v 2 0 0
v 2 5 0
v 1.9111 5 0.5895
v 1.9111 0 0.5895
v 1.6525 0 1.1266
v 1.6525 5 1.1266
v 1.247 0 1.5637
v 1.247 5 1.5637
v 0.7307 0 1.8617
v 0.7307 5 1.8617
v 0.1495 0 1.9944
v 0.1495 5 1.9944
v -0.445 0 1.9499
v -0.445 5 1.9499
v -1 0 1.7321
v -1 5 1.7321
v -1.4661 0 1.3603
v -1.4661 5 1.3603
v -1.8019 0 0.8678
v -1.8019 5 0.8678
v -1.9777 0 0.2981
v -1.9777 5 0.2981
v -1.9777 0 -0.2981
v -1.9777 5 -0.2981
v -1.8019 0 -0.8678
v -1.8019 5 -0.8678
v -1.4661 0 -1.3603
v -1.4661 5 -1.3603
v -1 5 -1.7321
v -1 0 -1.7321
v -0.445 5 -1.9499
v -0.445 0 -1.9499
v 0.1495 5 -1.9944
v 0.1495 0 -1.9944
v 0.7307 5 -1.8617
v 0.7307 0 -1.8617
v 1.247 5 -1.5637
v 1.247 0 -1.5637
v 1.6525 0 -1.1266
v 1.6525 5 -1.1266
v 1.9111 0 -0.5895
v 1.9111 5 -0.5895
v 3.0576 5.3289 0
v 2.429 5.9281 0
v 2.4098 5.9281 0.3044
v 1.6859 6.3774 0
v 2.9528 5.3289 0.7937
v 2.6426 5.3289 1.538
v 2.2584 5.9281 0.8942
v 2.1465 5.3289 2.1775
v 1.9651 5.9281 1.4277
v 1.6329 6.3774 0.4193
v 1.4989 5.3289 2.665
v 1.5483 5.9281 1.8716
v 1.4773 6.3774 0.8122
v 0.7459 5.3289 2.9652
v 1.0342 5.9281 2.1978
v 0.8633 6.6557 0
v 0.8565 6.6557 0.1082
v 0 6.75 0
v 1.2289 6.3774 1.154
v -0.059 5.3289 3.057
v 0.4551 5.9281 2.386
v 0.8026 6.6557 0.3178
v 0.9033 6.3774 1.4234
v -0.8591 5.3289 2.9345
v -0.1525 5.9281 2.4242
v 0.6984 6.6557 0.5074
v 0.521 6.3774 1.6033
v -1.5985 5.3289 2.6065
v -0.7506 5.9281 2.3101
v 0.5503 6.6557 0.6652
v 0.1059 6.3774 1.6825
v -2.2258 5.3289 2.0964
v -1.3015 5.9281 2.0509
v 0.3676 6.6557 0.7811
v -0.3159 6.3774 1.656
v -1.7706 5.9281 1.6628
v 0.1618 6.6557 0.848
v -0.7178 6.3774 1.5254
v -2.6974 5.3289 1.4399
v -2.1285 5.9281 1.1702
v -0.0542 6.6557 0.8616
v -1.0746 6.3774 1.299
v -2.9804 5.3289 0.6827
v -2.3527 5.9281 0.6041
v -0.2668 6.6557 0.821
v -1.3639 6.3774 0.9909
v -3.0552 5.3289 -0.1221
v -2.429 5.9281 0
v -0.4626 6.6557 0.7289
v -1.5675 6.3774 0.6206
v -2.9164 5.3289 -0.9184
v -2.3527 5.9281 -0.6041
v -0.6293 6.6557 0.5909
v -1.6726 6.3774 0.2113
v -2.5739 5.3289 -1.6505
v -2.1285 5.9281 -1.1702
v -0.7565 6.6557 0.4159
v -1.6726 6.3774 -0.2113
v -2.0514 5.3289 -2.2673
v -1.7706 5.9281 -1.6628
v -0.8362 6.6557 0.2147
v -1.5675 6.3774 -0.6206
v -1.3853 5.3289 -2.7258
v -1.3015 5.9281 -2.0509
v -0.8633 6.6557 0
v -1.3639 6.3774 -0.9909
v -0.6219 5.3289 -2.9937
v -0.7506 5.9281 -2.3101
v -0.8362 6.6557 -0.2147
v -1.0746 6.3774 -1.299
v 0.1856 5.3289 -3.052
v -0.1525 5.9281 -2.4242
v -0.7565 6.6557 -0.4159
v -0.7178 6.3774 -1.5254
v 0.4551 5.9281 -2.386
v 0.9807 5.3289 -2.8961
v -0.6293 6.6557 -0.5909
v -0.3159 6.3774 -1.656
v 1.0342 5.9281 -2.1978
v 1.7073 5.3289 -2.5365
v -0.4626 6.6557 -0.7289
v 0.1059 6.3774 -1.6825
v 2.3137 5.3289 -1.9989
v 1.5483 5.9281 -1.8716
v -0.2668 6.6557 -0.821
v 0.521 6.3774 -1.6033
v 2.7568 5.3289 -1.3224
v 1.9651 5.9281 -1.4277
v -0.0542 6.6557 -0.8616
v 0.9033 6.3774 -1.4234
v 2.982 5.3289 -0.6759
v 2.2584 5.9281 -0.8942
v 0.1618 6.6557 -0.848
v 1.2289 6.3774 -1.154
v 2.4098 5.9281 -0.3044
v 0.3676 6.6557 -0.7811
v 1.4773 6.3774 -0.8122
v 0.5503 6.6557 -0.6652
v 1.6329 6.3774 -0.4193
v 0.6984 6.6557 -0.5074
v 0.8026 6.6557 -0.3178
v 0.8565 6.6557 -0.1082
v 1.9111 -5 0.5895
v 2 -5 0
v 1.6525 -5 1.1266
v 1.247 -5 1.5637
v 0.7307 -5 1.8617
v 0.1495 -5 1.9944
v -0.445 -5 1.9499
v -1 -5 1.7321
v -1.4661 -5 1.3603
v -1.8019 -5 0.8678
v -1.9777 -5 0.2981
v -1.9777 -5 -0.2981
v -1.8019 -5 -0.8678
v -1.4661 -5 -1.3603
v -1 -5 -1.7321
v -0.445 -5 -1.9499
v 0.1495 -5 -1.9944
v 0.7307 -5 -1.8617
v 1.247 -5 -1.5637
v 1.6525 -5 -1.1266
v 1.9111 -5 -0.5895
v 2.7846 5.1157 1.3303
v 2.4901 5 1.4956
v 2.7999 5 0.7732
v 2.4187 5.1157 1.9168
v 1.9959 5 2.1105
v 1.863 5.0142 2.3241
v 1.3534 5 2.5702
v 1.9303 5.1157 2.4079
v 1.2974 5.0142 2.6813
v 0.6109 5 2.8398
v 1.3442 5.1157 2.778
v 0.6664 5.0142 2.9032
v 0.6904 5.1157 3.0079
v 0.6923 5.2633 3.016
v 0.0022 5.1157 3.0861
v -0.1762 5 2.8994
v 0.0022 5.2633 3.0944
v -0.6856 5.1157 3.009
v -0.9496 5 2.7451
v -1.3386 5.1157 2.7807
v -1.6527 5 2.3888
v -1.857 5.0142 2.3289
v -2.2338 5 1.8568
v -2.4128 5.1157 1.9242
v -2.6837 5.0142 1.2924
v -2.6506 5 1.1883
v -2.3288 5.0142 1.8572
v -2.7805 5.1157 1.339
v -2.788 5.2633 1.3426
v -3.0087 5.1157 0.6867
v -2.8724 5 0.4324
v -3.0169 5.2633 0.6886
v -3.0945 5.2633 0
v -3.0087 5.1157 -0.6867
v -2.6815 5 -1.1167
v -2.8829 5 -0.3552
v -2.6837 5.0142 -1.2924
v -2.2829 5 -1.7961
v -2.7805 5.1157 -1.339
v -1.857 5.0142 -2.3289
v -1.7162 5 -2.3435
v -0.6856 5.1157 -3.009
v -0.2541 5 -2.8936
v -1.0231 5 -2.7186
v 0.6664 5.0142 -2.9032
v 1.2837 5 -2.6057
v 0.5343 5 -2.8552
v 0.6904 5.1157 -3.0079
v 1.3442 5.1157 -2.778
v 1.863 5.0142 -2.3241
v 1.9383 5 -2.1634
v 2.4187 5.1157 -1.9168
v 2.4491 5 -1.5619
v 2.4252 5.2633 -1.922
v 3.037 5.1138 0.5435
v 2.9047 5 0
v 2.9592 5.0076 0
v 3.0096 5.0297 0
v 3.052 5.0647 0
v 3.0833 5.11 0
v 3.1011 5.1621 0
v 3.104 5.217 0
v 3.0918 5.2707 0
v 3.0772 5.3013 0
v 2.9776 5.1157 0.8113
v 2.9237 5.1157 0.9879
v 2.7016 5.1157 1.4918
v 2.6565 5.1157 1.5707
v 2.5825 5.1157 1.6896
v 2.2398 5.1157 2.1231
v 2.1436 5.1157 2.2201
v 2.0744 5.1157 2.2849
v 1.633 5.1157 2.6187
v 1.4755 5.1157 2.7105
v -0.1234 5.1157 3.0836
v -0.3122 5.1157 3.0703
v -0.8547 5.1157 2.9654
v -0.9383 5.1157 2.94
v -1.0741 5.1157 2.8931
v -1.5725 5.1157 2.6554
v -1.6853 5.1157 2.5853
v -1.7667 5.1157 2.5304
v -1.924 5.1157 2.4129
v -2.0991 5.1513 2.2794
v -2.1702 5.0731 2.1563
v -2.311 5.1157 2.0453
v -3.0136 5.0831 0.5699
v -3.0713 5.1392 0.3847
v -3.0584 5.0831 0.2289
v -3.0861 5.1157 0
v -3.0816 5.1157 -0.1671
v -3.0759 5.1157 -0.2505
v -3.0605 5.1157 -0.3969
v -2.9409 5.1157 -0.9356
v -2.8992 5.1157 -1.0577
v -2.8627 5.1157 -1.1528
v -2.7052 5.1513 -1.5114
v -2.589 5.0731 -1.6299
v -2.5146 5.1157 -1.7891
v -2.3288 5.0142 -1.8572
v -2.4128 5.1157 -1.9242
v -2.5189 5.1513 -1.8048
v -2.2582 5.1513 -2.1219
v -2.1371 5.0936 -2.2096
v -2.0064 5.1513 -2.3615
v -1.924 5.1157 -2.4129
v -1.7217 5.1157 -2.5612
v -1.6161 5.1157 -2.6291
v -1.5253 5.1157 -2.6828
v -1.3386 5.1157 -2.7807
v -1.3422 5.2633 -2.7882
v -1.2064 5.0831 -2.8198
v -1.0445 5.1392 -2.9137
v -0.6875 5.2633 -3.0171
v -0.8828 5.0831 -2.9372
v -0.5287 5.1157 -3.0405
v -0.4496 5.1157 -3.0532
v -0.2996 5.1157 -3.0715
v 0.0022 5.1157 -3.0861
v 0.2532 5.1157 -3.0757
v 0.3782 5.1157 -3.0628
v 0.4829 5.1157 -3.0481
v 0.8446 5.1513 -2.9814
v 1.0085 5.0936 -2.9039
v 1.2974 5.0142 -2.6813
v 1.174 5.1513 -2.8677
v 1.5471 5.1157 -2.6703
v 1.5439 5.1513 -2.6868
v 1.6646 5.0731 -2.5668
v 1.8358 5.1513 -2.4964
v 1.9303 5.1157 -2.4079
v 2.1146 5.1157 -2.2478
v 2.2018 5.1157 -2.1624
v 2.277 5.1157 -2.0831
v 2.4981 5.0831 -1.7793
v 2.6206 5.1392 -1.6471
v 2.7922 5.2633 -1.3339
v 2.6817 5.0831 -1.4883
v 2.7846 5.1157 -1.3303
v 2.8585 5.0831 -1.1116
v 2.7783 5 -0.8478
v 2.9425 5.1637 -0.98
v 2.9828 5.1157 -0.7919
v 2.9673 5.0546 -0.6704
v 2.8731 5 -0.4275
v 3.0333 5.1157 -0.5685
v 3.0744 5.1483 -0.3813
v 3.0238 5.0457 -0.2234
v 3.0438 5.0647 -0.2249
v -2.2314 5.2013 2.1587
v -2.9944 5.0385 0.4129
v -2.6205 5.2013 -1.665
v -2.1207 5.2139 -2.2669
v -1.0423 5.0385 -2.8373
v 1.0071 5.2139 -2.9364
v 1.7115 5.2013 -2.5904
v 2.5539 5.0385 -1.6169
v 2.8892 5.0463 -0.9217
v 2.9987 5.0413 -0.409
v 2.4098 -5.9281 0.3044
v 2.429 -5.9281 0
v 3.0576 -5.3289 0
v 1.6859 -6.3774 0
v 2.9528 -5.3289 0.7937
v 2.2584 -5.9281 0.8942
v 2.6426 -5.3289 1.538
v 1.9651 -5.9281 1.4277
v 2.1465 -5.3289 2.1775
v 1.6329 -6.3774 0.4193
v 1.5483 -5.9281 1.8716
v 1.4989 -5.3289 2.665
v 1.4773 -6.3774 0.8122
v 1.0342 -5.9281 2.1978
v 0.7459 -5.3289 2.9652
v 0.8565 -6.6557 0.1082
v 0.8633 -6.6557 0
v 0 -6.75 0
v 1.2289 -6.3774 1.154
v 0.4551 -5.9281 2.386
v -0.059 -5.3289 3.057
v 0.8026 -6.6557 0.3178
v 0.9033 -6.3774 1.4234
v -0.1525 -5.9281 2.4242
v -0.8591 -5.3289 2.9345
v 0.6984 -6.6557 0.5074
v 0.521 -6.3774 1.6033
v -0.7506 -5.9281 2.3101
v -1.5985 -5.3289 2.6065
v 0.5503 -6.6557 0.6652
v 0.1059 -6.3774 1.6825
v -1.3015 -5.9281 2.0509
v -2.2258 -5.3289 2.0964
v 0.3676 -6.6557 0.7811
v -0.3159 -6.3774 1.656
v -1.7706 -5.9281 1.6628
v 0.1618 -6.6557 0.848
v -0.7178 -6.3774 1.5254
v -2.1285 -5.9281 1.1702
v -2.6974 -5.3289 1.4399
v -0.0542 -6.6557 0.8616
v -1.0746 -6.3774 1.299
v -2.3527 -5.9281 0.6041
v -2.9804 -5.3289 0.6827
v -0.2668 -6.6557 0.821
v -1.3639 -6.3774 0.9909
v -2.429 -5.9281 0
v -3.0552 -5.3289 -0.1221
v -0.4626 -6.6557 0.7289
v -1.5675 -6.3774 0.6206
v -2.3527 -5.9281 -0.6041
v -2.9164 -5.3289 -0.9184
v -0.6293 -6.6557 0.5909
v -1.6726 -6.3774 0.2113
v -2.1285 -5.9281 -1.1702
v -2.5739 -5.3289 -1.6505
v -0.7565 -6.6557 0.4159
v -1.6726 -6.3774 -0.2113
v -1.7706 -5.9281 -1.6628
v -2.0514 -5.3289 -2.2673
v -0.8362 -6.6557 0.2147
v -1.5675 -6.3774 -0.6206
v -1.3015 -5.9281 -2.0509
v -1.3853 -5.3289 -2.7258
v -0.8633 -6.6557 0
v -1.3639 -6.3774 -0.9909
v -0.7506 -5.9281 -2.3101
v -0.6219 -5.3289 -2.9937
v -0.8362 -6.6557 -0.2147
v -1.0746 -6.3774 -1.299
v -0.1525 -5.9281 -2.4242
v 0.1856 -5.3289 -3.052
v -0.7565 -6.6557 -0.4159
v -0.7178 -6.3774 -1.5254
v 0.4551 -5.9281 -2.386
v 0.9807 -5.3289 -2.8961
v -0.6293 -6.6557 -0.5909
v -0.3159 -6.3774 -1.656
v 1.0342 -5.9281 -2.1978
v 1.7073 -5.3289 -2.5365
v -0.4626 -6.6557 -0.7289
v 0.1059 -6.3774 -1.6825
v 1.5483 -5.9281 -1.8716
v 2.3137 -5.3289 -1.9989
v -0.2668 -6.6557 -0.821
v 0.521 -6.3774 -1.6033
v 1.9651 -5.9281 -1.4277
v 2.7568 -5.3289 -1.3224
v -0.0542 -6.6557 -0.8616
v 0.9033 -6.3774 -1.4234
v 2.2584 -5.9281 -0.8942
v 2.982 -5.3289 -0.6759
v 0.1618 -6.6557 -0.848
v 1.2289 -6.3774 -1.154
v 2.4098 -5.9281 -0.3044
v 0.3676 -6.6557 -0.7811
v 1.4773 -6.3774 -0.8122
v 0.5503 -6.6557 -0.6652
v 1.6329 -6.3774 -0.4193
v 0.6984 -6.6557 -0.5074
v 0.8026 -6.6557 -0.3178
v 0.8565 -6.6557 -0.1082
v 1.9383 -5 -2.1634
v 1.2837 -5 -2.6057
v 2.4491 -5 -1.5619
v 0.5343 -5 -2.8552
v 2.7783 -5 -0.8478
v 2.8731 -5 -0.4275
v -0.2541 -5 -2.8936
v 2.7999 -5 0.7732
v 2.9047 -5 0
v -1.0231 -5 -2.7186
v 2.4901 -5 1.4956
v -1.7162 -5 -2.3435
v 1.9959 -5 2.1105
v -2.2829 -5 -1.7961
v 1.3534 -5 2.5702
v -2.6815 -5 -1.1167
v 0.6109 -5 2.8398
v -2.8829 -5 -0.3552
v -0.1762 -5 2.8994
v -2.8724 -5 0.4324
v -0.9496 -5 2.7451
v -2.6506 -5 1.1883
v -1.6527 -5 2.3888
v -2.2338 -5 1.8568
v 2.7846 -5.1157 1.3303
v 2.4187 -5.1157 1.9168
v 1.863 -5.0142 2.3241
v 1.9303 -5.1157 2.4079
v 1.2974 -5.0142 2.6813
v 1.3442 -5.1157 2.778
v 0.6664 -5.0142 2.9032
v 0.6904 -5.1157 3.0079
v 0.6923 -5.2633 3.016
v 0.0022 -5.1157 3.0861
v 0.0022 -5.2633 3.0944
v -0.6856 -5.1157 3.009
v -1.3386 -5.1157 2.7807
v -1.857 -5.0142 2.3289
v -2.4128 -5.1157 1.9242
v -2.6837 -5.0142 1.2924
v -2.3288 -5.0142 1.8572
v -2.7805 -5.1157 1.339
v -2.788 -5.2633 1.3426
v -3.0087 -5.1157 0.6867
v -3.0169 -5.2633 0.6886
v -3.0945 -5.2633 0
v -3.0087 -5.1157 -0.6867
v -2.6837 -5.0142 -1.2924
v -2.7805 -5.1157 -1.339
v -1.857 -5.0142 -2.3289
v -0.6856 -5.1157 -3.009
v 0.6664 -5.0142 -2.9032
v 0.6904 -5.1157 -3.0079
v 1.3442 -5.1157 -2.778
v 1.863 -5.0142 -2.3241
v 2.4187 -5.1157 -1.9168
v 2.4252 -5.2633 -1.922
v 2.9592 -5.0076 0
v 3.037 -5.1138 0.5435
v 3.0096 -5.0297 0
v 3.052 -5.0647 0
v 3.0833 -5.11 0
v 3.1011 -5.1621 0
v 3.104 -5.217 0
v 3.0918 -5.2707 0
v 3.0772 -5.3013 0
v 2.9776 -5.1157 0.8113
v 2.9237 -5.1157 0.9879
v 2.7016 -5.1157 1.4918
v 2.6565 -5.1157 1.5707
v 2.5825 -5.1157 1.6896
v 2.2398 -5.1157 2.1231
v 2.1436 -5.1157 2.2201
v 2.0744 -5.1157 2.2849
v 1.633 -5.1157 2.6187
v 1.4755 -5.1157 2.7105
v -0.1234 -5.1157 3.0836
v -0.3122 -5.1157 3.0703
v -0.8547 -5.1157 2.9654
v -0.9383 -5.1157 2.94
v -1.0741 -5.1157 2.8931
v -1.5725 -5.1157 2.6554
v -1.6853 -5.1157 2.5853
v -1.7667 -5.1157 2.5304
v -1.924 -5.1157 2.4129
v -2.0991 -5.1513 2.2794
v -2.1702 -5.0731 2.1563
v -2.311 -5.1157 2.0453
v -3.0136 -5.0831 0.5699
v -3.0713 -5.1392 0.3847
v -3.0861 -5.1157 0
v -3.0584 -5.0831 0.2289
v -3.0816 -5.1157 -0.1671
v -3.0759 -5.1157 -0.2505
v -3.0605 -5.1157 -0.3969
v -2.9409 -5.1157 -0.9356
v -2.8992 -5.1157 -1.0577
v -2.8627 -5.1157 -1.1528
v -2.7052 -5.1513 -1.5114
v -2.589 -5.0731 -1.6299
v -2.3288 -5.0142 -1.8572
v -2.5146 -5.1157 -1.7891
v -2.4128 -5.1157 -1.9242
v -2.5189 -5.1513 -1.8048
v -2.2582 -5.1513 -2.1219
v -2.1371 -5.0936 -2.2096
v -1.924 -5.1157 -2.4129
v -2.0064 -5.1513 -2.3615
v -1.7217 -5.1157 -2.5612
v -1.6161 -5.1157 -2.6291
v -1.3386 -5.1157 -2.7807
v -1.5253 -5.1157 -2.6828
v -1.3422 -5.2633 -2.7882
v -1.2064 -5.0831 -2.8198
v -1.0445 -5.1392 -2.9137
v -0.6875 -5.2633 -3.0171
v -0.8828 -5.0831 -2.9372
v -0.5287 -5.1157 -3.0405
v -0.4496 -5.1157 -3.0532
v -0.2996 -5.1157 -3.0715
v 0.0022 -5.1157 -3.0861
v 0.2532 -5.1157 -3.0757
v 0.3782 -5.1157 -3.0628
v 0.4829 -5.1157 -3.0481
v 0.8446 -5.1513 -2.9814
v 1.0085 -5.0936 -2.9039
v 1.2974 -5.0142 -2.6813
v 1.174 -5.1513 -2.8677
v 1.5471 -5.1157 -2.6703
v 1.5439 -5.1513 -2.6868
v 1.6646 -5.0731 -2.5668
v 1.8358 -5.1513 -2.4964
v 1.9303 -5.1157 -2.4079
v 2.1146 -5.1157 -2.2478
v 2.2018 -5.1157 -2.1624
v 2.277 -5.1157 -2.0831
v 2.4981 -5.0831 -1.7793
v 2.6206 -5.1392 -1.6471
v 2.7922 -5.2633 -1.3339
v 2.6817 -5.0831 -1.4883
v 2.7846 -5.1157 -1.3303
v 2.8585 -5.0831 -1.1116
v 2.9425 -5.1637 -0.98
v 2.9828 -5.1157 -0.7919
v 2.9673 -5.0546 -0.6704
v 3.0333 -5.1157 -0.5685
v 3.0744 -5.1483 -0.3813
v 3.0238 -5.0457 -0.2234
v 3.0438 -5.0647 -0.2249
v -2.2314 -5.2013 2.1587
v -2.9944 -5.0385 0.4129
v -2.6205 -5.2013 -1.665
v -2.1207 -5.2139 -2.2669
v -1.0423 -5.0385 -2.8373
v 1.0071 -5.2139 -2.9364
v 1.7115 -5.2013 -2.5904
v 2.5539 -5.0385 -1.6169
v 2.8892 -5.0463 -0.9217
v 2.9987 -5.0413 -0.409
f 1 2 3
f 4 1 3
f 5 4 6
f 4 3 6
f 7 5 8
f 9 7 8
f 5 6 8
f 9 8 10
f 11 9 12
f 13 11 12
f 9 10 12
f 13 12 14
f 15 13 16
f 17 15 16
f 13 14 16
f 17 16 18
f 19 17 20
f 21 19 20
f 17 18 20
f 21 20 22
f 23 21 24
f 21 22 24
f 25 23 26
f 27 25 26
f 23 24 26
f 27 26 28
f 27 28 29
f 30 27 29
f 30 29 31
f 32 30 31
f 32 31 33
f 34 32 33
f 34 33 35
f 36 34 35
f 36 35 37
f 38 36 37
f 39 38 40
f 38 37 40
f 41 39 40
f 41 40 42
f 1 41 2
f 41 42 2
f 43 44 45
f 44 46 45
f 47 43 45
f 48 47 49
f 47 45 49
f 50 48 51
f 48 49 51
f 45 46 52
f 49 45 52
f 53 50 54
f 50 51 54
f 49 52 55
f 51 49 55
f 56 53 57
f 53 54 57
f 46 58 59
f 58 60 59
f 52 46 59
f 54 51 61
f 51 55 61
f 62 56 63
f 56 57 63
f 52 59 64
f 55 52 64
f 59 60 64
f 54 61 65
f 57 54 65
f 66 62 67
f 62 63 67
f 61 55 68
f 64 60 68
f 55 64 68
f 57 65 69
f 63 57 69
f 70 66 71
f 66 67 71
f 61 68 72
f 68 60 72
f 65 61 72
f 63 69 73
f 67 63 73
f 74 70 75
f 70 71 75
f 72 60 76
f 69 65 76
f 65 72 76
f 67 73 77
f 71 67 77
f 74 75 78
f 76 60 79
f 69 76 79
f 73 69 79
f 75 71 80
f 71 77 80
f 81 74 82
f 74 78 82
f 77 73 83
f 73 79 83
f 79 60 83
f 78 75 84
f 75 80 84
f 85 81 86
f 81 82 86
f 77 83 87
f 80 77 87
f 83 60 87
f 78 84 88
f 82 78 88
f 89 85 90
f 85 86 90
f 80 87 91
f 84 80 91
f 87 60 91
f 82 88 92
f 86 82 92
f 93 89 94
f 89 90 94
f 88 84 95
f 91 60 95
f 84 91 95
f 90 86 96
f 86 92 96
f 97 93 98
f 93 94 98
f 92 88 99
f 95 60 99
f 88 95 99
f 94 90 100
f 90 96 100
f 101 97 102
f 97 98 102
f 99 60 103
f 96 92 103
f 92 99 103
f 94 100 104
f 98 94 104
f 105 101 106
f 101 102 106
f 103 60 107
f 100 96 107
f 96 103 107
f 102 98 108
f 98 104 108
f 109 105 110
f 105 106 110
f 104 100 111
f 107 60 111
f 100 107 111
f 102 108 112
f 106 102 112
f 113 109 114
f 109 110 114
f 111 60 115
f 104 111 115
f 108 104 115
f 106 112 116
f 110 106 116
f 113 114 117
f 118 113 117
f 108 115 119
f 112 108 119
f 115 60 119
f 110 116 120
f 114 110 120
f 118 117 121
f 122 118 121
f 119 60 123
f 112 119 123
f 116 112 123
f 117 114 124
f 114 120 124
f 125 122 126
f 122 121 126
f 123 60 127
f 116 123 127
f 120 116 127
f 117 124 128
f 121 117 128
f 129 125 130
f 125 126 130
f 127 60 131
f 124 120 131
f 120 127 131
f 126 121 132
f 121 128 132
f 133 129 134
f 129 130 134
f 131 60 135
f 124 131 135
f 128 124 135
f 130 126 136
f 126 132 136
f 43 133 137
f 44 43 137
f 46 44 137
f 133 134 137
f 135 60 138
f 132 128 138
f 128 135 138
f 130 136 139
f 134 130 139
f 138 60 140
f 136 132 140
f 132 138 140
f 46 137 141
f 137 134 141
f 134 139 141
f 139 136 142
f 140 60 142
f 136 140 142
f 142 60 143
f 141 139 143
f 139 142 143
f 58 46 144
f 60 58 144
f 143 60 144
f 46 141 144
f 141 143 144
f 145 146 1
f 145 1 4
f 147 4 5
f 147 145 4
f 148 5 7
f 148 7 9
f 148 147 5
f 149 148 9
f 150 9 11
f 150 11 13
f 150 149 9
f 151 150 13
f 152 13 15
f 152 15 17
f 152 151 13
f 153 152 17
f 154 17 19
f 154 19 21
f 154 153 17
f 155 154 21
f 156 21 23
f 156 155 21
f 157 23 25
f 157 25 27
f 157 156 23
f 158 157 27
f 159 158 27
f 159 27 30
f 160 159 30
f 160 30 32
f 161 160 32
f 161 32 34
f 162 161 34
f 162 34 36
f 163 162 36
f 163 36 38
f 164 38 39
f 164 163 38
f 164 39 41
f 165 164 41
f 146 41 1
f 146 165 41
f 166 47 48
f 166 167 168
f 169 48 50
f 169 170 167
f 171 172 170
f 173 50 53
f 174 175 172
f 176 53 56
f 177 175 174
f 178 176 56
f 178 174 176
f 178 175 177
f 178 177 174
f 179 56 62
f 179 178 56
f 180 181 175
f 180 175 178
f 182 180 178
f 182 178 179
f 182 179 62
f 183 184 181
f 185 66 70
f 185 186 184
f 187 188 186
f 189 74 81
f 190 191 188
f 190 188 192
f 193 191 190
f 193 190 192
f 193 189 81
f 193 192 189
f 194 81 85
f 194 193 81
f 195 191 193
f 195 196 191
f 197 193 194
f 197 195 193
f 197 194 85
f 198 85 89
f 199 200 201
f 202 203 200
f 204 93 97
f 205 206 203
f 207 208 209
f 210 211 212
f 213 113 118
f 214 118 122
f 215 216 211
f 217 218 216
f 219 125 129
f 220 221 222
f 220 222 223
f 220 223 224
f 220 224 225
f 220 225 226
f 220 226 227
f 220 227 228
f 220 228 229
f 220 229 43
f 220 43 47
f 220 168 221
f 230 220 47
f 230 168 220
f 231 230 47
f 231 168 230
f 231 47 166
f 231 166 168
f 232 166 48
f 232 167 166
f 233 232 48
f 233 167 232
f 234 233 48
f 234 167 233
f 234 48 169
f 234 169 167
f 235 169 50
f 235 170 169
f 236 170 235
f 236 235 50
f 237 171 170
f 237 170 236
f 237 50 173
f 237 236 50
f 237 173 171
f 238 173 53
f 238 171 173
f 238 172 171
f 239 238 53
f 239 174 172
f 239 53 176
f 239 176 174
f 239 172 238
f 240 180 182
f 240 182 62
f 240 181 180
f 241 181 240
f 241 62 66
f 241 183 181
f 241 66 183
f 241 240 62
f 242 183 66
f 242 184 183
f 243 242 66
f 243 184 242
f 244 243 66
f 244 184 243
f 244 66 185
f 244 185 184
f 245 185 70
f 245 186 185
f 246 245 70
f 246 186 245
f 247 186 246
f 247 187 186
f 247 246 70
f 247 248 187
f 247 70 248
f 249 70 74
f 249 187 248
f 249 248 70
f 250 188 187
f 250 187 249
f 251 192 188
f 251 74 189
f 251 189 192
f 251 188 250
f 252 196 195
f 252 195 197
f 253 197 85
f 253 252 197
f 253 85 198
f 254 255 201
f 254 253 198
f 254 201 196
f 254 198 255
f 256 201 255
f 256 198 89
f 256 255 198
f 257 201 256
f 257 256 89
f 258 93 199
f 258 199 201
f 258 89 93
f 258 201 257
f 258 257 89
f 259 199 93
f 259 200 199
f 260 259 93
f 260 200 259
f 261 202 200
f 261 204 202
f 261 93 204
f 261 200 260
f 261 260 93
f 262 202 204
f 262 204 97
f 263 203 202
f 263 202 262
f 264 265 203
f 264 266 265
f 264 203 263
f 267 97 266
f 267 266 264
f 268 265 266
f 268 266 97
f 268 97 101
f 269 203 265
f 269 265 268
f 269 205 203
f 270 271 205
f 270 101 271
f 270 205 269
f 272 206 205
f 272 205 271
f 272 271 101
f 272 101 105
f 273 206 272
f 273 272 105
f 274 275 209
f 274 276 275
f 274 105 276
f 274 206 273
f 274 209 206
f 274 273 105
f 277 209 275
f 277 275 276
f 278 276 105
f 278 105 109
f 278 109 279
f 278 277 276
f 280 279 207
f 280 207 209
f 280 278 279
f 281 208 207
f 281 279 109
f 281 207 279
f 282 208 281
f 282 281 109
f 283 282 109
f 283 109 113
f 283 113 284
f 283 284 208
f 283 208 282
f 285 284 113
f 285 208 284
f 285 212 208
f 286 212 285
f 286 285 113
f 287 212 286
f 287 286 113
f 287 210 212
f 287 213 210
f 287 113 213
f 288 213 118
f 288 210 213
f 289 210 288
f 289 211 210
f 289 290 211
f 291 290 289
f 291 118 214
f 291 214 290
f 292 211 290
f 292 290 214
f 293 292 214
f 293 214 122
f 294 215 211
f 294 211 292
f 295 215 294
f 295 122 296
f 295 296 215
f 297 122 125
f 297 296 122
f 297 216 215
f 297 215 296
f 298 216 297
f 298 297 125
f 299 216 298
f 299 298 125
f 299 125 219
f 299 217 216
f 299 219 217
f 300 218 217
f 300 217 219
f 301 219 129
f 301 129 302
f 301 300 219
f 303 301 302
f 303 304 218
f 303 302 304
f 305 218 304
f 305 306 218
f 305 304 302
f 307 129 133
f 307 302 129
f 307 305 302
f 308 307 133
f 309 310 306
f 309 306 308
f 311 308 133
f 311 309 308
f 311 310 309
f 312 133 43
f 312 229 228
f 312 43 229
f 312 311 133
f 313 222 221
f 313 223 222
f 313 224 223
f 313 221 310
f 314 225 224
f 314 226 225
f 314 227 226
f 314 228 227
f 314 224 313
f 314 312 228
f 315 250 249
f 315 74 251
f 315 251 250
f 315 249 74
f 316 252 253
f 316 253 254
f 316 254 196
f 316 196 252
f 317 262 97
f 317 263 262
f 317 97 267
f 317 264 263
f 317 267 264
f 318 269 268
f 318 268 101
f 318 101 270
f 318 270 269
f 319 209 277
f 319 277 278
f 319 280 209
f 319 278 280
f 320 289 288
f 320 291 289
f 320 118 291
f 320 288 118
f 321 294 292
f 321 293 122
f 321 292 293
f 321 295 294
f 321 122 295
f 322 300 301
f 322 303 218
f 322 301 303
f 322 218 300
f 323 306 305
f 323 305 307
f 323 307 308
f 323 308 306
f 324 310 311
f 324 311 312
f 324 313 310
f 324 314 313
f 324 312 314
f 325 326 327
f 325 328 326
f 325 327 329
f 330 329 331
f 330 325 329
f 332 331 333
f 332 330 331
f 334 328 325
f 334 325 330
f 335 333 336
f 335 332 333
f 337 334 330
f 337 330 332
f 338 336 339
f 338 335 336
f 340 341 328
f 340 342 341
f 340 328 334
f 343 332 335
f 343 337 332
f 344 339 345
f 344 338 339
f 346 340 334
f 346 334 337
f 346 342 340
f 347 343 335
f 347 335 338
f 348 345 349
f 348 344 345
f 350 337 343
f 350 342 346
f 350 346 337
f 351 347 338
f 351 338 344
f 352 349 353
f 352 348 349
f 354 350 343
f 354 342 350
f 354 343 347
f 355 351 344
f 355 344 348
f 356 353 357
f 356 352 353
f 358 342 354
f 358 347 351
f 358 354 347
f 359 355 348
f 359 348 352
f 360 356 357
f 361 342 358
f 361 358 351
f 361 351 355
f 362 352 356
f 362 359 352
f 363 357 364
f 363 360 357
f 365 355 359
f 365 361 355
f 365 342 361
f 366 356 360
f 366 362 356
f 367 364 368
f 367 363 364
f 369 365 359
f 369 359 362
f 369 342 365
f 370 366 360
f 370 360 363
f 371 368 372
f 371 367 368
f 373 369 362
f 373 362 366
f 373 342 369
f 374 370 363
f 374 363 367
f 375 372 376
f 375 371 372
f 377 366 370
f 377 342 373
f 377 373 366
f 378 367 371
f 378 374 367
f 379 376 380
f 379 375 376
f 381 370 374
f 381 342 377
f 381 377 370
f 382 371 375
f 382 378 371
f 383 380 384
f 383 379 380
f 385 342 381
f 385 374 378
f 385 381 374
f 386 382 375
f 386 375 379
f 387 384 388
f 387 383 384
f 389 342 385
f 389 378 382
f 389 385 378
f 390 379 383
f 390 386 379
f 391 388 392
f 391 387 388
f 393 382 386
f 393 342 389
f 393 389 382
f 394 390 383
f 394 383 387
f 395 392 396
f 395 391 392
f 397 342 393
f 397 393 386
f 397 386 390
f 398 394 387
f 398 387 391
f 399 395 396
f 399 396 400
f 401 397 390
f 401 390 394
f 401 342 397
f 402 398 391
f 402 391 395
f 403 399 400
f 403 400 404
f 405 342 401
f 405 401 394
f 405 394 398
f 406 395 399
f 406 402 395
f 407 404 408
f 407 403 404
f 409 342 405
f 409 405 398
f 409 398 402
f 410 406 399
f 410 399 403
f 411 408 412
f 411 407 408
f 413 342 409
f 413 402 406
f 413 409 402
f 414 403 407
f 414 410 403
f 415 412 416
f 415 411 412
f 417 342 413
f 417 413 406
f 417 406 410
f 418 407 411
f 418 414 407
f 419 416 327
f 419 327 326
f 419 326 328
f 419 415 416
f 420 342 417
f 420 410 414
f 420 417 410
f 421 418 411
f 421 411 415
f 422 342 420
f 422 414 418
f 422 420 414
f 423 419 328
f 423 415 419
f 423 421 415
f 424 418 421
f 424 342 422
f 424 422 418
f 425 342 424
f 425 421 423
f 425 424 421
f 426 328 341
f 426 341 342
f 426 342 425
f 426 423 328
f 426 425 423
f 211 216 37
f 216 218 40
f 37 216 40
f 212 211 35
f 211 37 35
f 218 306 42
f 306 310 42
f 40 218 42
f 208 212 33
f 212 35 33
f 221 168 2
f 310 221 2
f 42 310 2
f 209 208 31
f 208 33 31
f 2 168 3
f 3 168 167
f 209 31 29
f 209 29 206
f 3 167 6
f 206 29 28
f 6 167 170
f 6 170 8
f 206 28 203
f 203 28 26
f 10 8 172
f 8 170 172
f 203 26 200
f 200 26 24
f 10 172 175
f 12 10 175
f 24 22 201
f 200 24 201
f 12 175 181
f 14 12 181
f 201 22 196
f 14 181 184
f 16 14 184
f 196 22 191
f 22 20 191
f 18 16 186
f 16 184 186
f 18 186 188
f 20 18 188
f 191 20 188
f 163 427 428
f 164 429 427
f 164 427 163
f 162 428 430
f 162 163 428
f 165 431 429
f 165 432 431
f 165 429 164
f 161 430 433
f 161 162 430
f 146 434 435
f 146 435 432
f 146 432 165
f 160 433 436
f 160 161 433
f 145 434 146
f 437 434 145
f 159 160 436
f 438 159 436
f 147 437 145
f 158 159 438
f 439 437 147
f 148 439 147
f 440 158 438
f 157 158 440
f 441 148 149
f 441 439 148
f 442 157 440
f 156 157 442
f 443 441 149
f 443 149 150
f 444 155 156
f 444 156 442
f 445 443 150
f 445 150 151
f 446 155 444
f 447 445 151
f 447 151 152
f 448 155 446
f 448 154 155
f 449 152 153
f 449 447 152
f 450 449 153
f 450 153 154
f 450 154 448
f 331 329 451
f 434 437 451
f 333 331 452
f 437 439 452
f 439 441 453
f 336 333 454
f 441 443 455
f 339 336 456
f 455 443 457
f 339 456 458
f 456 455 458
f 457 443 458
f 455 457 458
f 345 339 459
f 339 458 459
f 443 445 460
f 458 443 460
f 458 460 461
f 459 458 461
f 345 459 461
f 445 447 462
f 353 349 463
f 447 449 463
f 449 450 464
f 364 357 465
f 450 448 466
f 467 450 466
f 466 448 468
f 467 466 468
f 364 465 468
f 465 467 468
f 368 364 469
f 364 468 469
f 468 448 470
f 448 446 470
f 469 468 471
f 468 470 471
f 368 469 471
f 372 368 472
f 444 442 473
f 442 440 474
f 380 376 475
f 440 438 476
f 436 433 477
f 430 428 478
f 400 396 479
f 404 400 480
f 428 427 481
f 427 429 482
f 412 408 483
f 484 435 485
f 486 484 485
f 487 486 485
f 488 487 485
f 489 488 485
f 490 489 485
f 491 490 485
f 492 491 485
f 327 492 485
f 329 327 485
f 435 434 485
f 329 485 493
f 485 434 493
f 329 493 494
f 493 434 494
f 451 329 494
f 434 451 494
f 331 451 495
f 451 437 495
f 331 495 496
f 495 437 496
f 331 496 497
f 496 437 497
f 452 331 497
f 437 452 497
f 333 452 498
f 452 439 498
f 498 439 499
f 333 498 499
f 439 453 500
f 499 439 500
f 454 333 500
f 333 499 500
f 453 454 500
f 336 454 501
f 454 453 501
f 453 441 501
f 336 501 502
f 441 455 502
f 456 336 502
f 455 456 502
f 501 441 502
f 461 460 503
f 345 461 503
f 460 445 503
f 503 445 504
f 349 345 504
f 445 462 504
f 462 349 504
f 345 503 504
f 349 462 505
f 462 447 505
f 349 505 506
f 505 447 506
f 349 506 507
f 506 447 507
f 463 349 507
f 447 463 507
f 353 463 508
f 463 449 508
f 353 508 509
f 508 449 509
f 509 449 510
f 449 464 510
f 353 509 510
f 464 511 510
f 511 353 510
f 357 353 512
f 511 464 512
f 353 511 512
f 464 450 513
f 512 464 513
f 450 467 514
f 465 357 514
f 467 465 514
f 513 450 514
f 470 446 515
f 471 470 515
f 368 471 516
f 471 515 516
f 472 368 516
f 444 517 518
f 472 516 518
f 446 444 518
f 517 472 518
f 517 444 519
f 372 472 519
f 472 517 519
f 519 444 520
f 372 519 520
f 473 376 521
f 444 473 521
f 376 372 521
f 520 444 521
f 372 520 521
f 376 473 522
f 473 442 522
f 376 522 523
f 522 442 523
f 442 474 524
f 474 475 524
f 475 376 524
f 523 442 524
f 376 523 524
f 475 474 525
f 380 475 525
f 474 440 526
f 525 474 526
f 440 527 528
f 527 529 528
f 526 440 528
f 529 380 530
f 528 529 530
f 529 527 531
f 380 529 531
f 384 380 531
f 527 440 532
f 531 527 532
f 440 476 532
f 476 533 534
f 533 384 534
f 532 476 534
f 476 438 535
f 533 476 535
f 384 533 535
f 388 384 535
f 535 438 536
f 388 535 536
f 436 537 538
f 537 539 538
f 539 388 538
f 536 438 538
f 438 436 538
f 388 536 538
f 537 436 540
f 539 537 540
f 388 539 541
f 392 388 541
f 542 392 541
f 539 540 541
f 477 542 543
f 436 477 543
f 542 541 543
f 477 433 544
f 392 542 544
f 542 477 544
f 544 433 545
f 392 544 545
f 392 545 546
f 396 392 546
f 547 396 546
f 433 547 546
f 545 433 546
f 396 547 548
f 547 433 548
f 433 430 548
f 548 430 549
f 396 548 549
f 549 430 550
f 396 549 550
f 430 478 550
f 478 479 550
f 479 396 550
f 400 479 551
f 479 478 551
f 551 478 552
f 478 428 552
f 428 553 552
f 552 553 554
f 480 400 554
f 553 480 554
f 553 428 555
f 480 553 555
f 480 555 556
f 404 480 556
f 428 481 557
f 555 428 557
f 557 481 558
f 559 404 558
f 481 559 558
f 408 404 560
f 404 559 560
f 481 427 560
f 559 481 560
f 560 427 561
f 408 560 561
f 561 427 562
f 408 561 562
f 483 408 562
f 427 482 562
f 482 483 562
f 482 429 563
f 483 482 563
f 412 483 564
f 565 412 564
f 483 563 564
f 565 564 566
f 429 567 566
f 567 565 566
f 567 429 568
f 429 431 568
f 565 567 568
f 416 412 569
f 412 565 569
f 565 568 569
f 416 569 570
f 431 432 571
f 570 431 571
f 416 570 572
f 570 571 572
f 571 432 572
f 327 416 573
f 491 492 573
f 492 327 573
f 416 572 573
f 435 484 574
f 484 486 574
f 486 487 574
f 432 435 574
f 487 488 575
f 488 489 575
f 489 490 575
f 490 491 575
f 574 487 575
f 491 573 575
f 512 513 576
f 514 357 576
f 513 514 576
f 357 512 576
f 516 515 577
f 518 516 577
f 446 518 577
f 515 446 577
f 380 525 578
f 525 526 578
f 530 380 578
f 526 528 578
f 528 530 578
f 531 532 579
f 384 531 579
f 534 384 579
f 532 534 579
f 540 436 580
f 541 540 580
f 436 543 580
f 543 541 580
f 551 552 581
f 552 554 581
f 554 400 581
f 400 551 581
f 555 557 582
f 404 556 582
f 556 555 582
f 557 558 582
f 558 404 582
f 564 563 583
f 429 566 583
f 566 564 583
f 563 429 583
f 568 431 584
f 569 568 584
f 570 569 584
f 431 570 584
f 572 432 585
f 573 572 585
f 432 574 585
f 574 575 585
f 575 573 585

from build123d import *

# Parameters (mm, degrees)
FILLET1_R = 0.2


with BuildPart() as part:
    # Sketch1 → Revolve1 (revolve)
    with BuildSketch(Plane.XY):
        with BuildLine():
            Line((0, 0), (2, 0))
            Line((2, 0), (2, 5))
            Line((2, 5), (3.307189139, 5))
            ThreePointArc((3.307189139, 5), (1.870828693, 6.285533906), (0, 6.75))
            Line((0, 6.75), (0, 0))
        make_face()
    revolve1 = revolve(axis=Axis((0, 6.75, 0), (0, -1, 0)))

    # Mirror1: Revolve1 across plane
    add(revolve1.mirror(Plane.ZX))

    # Fillet1
    fillet1_edges = [part.edges().sort_by_distance(p)[0] for p in [
        (-3.307189139, -5, 0),
        (-3.307189139, 5, 0),
    ]]
    fillet(fillet1_edges, radius=FILLET1_R)


solid = part.part
